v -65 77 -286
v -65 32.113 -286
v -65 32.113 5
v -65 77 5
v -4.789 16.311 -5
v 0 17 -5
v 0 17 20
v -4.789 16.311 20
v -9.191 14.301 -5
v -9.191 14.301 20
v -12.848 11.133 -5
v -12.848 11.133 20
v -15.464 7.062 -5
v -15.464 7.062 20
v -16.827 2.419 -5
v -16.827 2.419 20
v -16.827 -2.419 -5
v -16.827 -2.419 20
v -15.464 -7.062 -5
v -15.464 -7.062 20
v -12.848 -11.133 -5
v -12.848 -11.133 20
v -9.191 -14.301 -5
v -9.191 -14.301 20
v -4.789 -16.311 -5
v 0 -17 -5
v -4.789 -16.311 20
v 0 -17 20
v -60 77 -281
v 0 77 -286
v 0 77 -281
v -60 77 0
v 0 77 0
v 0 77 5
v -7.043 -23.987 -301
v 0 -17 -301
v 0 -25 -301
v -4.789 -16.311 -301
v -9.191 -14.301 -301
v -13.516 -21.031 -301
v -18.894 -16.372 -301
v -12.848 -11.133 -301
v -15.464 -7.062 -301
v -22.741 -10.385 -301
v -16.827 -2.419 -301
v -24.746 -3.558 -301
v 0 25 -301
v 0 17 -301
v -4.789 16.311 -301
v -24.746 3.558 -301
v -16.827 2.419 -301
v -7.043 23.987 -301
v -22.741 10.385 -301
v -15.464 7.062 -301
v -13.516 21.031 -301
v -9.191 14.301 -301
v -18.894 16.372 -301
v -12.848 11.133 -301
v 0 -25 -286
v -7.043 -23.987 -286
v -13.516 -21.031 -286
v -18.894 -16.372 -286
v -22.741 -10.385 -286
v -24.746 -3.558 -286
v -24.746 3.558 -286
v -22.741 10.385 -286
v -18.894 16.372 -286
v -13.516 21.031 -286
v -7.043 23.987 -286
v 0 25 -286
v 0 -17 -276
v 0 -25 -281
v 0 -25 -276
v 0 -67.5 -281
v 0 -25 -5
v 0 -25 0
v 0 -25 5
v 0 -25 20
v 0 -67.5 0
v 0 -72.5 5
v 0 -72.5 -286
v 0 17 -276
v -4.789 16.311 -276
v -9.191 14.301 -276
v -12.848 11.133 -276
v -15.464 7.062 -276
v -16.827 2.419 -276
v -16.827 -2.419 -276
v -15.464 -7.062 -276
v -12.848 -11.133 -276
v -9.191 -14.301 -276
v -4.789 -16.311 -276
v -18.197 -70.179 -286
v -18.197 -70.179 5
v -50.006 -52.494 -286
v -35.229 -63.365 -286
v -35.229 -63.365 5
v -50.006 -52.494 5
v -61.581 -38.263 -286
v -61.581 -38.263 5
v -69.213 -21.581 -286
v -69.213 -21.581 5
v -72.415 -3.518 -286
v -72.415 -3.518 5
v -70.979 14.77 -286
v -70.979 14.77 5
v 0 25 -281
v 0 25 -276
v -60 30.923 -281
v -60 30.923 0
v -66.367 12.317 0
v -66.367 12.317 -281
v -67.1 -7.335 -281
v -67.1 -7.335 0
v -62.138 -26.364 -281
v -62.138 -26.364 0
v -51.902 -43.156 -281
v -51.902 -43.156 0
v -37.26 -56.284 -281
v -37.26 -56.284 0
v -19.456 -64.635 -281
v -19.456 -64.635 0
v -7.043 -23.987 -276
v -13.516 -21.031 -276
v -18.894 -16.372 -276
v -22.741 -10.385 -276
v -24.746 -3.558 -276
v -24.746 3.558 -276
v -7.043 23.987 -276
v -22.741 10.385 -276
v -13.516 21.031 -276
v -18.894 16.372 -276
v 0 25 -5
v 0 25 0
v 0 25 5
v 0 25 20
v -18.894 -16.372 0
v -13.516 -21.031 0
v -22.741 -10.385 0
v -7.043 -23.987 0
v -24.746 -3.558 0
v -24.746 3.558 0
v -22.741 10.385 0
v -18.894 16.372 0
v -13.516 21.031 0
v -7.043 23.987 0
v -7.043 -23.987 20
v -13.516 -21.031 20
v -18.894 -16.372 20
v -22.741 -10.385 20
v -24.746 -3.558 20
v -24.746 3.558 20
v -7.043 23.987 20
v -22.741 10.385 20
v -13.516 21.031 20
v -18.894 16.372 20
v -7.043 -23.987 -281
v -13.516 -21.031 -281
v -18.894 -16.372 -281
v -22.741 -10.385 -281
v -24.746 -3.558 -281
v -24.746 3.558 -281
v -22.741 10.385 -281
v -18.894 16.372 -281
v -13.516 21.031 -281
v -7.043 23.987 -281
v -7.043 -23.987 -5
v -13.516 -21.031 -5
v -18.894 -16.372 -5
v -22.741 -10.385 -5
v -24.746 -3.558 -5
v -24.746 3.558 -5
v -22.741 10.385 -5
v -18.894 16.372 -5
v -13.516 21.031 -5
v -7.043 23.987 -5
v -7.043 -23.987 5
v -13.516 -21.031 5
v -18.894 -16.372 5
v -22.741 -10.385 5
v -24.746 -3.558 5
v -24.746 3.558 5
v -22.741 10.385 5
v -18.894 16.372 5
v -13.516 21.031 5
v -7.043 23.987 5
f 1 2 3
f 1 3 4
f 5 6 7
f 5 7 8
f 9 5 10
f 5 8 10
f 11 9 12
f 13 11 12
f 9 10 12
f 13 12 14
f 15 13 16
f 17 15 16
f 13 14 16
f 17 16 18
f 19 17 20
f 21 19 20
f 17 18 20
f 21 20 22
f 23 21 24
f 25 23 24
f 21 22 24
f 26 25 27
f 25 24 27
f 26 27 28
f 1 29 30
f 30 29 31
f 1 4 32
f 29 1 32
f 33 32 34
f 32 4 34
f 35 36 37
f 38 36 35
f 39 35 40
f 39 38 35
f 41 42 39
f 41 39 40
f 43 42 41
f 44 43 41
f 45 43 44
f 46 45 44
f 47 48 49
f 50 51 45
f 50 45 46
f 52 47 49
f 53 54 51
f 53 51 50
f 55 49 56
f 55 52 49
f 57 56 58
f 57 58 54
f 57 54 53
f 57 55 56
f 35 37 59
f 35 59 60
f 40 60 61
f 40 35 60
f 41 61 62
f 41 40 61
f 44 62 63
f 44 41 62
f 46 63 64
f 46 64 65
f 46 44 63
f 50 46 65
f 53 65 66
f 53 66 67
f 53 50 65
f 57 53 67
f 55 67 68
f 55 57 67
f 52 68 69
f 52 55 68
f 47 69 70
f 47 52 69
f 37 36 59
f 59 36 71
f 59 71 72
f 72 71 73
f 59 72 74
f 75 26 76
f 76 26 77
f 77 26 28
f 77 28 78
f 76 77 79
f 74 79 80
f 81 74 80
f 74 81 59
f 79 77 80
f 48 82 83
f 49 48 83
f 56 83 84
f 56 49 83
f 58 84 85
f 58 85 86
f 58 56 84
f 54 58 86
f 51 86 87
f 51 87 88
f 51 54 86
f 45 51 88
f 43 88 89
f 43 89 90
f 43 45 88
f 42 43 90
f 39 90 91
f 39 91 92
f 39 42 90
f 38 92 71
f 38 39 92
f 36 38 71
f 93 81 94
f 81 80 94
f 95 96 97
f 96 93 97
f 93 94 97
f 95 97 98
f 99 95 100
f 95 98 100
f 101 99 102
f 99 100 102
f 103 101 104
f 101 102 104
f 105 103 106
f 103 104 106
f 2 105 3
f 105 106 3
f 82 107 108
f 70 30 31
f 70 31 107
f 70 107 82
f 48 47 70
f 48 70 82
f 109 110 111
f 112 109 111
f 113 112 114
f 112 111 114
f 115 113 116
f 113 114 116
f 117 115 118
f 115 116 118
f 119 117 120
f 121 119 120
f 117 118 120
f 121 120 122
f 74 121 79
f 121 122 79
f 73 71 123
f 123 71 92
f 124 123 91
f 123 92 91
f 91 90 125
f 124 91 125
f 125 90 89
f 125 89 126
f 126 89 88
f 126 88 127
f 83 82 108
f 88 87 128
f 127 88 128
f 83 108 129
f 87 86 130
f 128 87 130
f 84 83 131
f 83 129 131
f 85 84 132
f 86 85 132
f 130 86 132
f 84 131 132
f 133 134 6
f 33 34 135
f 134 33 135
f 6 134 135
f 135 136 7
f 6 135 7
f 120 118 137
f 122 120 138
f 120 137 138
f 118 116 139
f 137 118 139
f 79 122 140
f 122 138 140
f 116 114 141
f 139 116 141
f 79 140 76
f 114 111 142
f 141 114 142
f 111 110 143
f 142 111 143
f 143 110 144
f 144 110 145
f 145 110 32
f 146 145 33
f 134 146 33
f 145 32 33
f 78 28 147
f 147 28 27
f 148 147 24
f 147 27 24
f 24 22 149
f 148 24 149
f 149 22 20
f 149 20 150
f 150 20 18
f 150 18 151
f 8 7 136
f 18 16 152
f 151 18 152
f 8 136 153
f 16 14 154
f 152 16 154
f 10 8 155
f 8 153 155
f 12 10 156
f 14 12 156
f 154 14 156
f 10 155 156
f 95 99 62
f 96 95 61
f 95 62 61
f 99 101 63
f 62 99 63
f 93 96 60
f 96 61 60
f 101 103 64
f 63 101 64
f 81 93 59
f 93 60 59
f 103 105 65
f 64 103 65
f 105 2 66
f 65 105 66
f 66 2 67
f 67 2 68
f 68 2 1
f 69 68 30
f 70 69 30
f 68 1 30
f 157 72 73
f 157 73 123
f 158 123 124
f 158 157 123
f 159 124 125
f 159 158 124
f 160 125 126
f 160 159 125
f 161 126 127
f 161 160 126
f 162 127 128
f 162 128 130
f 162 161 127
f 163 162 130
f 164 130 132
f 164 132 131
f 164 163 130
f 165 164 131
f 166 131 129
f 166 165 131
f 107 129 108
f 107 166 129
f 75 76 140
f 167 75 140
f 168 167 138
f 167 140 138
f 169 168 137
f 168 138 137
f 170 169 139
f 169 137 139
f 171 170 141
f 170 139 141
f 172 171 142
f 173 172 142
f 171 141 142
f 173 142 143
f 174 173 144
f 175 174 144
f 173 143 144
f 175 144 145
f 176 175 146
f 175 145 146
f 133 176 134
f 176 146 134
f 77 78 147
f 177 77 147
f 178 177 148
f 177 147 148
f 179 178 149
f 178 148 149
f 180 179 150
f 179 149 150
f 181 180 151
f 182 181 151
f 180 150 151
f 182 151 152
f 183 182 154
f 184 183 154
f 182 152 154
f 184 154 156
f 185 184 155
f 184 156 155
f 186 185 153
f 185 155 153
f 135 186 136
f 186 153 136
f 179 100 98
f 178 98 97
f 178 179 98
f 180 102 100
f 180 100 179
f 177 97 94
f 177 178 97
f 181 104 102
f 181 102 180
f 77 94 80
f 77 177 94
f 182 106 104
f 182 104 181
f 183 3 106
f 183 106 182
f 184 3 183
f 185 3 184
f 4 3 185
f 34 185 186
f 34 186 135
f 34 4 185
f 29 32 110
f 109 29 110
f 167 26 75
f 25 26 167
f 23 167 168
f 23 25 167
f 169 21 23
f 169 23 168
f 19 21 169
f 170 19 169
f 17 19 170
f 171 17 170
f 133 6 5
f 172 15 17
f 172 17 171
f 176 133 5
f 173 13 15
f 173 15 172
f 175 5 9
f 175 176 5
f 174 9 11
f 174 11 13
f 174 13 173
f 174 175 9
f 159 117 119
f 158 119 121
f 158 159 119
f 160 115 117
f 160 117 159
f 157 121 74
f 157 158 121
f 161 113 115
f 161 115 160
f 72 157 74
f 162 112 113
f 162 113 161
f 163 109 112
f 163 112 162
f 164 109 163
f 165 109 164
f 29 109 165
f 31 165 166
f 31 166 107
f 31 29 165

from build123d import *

# Parameters (mm, degrees)
BOSS_EXTRUDE1_DEPTH      = 20
BOSS_EXTRUDE1_DEPTH_BACK = 5
BOSS_EXTRUDE2_DEPTH      = 5
BOSS_EXTRUDE4_DEPTH      = 281


with BuildPart() as part:
    # Sketch1 → Boss-Extrude1 (new body, two sides)
    with BuildSketch(Plane.XY) as boss_extrude1_sk:
        with BuildLine():
            Line((0, 25), (0, 17))
            ThreePointArc((0, 17), (-17, 0), (0, -17))
            Line((0, -17), (0, -25))
            ThreePointArc((0, -25), (-25, 0), (0, 25))
        make_face()
    extrude(amount=BOSS_EXTRUDE1_DEPTH)
    extrude(boss_extrude1_sk.sketch, amount=-BOSS_EXTRUDE1_DEPTH_BACK)

    # Sketch2 → Boss-Extrude2 (add)
    with BuildSketch(Plane.XY):
        with BuildLine():
            Line((0, 25), (0, 77))
            Line((0, 77), (-65, 77))
            Line((-65, 77), (-65, 32.113081447))
            ThreePointArc((-65, 32.113081447), (-61.581037686, -38.262590053), (0, -72.5))
            Line((0, -72.5), (0, -25))
            ThreePointArc((0, -25), (-25, 0), (0, 25))
        make_face()
    extrude(amount=BOSS_EXTRUDE2_DEPTH)


with BuildPart() as body_2:
    # Mirror2: mirrored copy
    add(part.part.mirror(Plane.XY.offset(-140.5)))


with BuildPart() as part_1:
    add(part.part)

    add(body_2.part)  # Boss-Extrude4 merges body 2
    # Sketch3 → Boss-Extrude4 (add)
    with BuildSketch(Plane(origin=(0, 0, 0), x_dir=(-1, 0, 0), z_dir=(0, 0, -1))):
        with BuildLine():
            Line((60, 77), (60, 30.923292192))
            ThreePointArc((60, 30.923292192), (57.634938288, -35.134938288), (0, -67.5))
            Line((0, -67.5), (0, -72.5))
            ThreePointArc((0, -72.5), (61.581037686, -38.262590053), (65, 32.113081447))
            Line((65, 32.113081447), (65, 77))
            Line((65, 77), (60, 77))
        make_face()
    extrude(amount=BOSS_EXTRUDE4_DEPTH)


solid = part_1.part
